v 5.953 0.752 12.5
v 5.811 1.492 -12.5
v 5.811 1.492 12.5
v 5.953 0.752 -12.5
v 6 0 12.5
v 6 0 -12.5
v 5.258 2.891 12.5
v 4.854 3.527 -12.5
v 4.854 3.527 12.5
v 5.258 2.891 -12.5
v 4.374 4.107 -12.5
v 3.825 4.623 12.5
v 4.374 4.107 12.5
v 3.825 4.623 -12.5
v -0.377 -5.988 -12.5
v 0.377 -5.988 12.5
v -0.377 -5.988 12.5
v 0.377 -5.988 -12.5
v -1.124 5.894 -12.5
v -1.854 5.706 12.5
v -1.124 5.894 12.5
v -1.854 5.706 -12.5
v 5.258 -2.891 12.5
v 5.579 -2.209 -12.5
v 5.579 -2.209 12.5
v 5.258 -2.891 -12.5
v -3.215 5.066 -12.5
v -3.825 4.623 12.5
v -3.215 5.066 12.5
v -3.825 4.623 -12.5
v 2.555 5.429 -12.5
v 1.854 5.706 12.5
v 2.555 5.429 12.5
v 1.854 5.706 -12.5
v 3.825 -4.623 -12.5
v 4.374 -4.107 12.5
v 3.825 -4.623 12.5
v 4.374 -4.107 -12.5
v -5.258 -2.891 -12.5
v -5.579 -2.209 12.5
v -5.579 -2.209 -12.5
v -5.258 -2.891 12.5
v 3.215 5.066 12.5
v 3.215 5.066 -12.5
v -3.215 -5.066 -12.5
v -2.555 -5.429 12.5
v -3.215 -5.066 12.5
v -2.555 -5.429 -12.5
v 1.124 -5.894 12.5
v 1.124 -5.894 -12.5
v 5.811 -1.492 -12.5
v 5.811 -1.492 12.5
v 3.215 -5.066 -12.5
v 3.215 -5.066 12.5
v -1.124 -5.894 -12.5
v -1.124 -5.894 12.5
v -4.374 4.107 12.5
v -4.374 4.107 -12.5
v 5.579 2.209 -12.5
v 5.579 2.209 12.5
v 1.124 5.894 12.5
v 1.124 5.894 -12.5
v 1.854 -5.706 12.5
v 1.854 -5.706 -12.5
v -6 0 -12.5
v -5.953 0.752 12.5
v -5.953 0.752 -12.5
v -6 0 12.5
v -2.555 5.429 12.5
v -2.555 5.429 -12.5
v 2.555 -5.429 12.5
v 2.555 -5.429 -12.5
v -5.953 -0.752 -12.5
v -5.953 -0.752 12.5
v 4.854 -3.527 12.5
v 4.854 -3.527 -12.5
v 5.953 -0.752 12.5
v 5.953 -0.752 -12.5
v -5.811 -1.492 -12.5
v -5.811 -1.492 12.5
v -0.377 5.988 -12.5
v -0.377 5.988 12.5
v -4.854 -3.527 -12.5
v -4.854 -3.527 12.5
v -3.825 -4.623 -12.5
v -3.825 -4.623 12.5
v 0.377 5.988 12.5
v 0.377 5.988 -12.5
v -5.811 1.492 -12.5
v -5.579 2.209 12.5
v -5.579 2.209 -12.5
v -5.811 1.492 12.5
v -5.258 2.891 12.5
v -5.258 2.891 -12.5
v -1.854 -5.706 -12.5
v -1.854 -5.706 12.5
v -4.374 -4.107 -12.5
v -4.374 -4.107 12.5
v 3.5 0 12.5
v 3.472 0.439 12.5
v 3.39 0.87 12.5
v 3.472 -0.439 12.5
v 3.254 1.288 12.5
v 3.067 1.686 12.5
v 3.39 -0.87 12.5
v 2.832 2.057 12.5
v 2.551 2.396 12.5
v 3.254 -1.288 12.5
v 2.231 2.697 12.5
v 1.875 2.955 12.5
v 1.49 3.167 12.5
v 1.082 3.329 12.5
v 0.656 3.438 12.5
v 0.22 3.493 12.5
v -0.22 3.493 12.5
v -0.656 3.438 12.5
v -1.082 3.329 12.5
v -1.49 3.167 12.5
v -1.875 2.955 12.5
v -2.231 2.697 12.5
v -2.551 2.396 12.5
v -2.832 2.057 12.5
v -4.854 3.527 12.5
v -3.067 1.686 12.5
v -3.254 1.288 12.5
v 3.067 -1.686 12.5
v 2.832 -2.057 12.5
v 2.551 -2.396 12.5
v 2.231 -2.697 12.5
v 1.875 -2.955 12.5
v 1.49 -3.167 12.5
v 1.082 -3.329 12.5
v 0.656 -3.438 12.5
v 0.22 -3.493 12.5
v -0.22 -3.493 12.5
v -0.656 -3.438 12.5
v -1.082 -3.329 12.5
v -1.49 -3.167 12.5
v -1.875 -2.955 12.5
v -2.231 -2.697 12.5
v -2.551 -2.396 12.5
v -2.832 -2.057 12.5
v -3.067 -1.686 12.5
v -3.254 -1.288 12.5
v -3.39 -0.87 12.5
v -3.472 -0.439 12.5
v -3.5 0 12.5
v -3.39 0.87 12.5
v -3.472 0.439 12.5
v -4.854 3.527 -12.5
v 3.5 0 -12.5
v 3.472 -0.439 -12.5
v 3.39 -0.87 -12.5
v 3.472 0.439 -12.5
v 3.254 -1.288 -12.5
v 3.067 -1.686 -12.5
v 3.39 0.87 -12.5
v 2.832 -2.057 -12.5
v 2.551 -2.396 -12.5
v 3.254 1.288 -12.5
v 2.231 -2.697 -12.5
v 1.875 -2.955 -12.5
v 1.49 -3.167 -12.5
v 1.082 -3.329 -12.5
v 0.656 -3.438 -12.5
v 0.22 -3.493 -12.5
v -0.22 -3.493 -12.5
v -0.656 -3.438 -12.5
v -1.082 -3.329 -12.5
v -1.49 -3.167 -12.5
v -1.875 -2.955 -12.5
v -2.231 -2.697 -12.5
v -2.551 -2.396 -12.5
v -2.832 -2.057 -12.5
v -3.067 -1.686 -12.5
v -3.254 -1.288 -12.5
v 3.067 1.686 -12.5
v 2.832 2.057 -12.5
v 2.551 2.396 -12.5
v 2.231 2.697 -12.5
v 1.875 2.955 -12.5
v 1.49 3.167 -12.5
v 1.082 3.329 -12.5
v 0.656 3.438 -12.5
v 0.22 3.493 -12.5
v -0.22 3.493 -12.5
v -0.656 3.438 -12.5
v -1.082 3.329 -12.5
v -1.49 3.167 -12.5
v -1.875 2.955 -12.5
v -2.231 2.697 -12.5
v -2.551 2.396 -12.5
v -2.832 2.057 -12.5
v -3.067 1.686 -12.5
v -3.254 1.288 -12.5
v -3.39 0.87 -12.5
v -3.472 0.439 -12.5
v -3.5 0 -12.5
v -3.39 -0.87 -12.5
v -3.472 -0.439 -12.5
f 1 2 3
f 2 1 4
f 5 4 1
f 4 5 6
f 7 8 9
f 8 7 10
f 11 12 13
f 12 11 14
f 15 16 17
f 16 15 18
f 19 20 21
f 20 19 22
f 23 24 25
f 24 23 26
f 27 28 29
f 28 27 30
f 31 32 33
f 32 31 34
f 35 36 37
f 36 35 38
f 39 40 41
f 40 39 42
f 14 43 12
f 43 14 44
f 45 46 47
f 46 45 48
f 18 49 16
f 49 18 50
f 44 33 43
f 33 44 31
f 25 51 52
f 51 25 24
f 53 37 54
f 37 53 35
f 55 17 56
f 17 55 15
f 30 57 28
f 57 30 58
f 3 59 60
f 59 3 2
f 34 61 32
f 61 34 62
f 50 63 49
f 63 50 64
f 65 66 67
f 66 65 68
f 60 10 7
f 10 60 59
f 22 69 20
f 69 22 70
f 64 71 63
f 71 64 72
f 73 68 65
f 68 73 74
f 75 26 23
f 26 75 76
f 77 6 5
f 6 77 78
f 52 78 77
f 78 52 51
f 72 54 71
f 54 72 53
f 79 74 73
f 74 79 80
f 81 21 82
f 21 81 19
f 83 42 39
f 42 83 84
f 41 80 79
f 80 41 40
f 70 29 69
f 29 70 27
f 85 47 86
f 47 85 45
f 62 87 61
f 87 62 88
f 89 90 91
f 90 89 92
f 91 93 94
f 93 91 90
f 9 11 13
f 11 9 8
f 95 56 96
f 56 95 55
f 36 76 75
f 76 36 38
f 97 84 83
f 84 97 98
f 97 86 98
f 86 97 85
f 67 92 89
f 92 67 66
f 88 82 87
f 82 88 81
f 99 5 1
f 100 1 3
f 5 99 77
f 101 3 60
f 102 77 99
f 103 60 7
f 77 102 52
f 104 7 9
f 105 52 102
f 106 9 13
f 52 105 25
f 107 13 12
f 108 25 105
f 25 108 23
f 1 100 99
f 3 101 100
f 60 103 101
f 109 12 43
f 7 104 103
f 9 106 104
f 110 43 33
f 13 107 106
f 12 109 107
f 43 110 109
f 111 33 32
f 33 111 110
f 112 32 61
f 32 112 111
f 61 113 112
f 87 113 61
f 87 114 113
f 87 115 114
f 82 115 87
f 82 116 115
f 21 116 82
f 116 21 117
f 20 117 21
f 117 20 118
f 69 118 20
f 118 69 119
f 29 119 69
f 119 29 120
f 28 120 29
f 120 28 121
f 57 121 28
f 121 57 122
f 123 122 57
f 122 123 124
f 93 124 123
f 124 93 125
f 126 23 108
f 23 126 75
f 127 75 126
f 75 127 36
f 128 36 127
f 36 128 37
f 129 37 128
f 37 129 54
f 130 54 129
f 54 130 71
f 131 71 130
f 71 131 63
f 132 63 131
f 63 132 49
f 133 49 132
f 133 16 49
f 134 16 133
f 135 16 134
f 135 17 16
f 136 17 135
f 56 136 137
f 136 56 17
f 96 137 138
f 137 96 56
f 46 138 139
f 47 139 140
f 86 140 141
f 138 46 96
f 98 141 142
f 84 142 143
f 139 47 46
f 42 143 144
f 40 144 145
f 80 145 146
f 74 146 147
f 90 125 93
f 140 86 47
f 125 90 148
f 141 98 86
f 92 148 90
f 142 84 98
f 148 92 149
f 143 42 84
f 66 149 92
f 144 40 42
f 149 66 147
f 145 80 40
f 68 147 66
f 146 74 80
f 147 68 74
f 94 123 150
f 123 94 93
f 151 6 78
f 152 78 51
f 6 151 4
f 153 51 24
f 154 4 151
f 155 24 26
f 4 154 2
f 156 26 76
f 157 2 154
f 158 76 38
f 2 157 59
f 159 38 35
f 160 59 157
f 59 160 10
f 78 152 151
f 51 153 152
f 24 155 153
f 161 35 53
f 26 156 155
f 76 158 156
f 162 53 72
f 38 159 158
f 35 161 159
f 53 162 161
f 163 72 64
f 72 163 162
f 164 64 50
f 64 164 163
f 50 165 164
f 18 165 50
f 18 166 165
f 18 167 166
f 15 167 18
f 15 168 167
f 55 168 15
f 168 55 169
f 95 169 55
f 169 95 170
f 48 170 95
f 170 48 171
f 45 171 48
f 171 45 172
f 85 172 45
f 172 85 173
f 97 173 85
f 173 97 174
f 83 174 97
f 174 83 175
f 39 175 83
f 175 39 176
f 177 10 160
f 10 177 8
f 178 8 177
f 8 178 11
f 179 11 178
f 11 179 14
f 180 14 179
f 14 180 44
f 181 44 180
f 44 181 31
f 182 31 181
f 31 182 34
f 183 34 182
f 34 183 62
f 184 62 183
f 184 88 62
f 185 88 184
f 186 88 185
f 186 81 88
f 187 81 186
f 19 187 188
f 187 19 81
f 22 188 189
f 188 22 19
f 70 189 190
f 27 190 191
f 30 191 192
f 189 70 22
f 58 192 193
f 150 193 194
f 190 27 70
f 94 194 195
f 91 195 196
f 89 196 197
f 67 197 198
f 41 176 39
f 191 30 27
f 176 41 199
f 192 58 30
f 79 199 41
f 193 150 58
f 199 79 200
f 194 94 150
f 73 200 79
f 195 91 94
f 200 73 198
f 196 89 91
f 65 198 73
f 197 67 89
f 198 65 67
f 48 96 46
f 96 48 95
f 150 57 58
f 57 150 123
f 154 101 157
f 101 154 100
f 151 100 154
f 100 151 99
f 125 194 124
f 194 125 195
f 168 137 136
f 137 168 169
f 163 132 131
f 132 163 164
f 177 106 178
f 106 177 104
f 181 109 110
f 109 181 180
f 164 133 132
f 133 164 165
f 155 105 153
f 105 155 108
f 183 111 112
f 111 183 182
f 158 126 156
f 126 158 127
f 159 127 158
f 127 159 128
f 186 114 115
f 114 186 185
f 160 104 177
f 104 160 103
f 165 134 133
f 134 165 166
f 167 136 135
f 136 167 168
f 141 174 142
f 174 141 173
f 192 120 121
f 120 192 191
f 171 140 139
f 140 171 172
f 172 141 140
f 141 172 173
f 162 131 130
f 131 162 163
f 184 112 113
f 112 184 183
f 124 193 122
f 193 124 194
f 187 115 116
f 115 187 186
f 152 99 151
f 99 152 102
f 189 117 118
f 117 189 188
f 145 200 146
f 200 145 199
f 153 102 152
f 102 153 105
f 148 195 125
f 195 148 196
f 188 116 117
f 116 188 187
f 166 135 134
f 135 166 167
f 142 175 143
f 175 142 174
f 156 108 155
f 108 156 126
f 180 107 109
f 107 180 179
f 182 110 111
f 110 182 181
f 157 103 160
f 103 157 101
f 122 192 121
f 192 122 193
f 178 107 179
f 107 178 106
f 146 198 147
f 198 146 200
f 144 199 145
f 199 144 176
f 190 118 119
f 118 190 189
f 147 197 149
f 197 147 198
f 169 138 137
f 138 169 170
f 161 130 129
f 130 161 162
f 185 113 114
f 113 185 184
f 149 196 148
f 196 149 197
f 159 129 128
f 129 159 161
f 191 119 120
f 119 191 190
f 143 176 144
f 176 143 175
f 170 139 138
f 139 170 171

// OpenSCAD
$fn = 50;


difference() {
	union() {
		translate(v = [0, 0, -12.5000000000]) {
			cylinder(h = 25, r = 6.0000000000);
		}
	}
	union() {
		translate(v = [0, 0, -100.0000000000]) {
			cylinder(h = 200, r = 3.5000000000);
		}
	}
}
